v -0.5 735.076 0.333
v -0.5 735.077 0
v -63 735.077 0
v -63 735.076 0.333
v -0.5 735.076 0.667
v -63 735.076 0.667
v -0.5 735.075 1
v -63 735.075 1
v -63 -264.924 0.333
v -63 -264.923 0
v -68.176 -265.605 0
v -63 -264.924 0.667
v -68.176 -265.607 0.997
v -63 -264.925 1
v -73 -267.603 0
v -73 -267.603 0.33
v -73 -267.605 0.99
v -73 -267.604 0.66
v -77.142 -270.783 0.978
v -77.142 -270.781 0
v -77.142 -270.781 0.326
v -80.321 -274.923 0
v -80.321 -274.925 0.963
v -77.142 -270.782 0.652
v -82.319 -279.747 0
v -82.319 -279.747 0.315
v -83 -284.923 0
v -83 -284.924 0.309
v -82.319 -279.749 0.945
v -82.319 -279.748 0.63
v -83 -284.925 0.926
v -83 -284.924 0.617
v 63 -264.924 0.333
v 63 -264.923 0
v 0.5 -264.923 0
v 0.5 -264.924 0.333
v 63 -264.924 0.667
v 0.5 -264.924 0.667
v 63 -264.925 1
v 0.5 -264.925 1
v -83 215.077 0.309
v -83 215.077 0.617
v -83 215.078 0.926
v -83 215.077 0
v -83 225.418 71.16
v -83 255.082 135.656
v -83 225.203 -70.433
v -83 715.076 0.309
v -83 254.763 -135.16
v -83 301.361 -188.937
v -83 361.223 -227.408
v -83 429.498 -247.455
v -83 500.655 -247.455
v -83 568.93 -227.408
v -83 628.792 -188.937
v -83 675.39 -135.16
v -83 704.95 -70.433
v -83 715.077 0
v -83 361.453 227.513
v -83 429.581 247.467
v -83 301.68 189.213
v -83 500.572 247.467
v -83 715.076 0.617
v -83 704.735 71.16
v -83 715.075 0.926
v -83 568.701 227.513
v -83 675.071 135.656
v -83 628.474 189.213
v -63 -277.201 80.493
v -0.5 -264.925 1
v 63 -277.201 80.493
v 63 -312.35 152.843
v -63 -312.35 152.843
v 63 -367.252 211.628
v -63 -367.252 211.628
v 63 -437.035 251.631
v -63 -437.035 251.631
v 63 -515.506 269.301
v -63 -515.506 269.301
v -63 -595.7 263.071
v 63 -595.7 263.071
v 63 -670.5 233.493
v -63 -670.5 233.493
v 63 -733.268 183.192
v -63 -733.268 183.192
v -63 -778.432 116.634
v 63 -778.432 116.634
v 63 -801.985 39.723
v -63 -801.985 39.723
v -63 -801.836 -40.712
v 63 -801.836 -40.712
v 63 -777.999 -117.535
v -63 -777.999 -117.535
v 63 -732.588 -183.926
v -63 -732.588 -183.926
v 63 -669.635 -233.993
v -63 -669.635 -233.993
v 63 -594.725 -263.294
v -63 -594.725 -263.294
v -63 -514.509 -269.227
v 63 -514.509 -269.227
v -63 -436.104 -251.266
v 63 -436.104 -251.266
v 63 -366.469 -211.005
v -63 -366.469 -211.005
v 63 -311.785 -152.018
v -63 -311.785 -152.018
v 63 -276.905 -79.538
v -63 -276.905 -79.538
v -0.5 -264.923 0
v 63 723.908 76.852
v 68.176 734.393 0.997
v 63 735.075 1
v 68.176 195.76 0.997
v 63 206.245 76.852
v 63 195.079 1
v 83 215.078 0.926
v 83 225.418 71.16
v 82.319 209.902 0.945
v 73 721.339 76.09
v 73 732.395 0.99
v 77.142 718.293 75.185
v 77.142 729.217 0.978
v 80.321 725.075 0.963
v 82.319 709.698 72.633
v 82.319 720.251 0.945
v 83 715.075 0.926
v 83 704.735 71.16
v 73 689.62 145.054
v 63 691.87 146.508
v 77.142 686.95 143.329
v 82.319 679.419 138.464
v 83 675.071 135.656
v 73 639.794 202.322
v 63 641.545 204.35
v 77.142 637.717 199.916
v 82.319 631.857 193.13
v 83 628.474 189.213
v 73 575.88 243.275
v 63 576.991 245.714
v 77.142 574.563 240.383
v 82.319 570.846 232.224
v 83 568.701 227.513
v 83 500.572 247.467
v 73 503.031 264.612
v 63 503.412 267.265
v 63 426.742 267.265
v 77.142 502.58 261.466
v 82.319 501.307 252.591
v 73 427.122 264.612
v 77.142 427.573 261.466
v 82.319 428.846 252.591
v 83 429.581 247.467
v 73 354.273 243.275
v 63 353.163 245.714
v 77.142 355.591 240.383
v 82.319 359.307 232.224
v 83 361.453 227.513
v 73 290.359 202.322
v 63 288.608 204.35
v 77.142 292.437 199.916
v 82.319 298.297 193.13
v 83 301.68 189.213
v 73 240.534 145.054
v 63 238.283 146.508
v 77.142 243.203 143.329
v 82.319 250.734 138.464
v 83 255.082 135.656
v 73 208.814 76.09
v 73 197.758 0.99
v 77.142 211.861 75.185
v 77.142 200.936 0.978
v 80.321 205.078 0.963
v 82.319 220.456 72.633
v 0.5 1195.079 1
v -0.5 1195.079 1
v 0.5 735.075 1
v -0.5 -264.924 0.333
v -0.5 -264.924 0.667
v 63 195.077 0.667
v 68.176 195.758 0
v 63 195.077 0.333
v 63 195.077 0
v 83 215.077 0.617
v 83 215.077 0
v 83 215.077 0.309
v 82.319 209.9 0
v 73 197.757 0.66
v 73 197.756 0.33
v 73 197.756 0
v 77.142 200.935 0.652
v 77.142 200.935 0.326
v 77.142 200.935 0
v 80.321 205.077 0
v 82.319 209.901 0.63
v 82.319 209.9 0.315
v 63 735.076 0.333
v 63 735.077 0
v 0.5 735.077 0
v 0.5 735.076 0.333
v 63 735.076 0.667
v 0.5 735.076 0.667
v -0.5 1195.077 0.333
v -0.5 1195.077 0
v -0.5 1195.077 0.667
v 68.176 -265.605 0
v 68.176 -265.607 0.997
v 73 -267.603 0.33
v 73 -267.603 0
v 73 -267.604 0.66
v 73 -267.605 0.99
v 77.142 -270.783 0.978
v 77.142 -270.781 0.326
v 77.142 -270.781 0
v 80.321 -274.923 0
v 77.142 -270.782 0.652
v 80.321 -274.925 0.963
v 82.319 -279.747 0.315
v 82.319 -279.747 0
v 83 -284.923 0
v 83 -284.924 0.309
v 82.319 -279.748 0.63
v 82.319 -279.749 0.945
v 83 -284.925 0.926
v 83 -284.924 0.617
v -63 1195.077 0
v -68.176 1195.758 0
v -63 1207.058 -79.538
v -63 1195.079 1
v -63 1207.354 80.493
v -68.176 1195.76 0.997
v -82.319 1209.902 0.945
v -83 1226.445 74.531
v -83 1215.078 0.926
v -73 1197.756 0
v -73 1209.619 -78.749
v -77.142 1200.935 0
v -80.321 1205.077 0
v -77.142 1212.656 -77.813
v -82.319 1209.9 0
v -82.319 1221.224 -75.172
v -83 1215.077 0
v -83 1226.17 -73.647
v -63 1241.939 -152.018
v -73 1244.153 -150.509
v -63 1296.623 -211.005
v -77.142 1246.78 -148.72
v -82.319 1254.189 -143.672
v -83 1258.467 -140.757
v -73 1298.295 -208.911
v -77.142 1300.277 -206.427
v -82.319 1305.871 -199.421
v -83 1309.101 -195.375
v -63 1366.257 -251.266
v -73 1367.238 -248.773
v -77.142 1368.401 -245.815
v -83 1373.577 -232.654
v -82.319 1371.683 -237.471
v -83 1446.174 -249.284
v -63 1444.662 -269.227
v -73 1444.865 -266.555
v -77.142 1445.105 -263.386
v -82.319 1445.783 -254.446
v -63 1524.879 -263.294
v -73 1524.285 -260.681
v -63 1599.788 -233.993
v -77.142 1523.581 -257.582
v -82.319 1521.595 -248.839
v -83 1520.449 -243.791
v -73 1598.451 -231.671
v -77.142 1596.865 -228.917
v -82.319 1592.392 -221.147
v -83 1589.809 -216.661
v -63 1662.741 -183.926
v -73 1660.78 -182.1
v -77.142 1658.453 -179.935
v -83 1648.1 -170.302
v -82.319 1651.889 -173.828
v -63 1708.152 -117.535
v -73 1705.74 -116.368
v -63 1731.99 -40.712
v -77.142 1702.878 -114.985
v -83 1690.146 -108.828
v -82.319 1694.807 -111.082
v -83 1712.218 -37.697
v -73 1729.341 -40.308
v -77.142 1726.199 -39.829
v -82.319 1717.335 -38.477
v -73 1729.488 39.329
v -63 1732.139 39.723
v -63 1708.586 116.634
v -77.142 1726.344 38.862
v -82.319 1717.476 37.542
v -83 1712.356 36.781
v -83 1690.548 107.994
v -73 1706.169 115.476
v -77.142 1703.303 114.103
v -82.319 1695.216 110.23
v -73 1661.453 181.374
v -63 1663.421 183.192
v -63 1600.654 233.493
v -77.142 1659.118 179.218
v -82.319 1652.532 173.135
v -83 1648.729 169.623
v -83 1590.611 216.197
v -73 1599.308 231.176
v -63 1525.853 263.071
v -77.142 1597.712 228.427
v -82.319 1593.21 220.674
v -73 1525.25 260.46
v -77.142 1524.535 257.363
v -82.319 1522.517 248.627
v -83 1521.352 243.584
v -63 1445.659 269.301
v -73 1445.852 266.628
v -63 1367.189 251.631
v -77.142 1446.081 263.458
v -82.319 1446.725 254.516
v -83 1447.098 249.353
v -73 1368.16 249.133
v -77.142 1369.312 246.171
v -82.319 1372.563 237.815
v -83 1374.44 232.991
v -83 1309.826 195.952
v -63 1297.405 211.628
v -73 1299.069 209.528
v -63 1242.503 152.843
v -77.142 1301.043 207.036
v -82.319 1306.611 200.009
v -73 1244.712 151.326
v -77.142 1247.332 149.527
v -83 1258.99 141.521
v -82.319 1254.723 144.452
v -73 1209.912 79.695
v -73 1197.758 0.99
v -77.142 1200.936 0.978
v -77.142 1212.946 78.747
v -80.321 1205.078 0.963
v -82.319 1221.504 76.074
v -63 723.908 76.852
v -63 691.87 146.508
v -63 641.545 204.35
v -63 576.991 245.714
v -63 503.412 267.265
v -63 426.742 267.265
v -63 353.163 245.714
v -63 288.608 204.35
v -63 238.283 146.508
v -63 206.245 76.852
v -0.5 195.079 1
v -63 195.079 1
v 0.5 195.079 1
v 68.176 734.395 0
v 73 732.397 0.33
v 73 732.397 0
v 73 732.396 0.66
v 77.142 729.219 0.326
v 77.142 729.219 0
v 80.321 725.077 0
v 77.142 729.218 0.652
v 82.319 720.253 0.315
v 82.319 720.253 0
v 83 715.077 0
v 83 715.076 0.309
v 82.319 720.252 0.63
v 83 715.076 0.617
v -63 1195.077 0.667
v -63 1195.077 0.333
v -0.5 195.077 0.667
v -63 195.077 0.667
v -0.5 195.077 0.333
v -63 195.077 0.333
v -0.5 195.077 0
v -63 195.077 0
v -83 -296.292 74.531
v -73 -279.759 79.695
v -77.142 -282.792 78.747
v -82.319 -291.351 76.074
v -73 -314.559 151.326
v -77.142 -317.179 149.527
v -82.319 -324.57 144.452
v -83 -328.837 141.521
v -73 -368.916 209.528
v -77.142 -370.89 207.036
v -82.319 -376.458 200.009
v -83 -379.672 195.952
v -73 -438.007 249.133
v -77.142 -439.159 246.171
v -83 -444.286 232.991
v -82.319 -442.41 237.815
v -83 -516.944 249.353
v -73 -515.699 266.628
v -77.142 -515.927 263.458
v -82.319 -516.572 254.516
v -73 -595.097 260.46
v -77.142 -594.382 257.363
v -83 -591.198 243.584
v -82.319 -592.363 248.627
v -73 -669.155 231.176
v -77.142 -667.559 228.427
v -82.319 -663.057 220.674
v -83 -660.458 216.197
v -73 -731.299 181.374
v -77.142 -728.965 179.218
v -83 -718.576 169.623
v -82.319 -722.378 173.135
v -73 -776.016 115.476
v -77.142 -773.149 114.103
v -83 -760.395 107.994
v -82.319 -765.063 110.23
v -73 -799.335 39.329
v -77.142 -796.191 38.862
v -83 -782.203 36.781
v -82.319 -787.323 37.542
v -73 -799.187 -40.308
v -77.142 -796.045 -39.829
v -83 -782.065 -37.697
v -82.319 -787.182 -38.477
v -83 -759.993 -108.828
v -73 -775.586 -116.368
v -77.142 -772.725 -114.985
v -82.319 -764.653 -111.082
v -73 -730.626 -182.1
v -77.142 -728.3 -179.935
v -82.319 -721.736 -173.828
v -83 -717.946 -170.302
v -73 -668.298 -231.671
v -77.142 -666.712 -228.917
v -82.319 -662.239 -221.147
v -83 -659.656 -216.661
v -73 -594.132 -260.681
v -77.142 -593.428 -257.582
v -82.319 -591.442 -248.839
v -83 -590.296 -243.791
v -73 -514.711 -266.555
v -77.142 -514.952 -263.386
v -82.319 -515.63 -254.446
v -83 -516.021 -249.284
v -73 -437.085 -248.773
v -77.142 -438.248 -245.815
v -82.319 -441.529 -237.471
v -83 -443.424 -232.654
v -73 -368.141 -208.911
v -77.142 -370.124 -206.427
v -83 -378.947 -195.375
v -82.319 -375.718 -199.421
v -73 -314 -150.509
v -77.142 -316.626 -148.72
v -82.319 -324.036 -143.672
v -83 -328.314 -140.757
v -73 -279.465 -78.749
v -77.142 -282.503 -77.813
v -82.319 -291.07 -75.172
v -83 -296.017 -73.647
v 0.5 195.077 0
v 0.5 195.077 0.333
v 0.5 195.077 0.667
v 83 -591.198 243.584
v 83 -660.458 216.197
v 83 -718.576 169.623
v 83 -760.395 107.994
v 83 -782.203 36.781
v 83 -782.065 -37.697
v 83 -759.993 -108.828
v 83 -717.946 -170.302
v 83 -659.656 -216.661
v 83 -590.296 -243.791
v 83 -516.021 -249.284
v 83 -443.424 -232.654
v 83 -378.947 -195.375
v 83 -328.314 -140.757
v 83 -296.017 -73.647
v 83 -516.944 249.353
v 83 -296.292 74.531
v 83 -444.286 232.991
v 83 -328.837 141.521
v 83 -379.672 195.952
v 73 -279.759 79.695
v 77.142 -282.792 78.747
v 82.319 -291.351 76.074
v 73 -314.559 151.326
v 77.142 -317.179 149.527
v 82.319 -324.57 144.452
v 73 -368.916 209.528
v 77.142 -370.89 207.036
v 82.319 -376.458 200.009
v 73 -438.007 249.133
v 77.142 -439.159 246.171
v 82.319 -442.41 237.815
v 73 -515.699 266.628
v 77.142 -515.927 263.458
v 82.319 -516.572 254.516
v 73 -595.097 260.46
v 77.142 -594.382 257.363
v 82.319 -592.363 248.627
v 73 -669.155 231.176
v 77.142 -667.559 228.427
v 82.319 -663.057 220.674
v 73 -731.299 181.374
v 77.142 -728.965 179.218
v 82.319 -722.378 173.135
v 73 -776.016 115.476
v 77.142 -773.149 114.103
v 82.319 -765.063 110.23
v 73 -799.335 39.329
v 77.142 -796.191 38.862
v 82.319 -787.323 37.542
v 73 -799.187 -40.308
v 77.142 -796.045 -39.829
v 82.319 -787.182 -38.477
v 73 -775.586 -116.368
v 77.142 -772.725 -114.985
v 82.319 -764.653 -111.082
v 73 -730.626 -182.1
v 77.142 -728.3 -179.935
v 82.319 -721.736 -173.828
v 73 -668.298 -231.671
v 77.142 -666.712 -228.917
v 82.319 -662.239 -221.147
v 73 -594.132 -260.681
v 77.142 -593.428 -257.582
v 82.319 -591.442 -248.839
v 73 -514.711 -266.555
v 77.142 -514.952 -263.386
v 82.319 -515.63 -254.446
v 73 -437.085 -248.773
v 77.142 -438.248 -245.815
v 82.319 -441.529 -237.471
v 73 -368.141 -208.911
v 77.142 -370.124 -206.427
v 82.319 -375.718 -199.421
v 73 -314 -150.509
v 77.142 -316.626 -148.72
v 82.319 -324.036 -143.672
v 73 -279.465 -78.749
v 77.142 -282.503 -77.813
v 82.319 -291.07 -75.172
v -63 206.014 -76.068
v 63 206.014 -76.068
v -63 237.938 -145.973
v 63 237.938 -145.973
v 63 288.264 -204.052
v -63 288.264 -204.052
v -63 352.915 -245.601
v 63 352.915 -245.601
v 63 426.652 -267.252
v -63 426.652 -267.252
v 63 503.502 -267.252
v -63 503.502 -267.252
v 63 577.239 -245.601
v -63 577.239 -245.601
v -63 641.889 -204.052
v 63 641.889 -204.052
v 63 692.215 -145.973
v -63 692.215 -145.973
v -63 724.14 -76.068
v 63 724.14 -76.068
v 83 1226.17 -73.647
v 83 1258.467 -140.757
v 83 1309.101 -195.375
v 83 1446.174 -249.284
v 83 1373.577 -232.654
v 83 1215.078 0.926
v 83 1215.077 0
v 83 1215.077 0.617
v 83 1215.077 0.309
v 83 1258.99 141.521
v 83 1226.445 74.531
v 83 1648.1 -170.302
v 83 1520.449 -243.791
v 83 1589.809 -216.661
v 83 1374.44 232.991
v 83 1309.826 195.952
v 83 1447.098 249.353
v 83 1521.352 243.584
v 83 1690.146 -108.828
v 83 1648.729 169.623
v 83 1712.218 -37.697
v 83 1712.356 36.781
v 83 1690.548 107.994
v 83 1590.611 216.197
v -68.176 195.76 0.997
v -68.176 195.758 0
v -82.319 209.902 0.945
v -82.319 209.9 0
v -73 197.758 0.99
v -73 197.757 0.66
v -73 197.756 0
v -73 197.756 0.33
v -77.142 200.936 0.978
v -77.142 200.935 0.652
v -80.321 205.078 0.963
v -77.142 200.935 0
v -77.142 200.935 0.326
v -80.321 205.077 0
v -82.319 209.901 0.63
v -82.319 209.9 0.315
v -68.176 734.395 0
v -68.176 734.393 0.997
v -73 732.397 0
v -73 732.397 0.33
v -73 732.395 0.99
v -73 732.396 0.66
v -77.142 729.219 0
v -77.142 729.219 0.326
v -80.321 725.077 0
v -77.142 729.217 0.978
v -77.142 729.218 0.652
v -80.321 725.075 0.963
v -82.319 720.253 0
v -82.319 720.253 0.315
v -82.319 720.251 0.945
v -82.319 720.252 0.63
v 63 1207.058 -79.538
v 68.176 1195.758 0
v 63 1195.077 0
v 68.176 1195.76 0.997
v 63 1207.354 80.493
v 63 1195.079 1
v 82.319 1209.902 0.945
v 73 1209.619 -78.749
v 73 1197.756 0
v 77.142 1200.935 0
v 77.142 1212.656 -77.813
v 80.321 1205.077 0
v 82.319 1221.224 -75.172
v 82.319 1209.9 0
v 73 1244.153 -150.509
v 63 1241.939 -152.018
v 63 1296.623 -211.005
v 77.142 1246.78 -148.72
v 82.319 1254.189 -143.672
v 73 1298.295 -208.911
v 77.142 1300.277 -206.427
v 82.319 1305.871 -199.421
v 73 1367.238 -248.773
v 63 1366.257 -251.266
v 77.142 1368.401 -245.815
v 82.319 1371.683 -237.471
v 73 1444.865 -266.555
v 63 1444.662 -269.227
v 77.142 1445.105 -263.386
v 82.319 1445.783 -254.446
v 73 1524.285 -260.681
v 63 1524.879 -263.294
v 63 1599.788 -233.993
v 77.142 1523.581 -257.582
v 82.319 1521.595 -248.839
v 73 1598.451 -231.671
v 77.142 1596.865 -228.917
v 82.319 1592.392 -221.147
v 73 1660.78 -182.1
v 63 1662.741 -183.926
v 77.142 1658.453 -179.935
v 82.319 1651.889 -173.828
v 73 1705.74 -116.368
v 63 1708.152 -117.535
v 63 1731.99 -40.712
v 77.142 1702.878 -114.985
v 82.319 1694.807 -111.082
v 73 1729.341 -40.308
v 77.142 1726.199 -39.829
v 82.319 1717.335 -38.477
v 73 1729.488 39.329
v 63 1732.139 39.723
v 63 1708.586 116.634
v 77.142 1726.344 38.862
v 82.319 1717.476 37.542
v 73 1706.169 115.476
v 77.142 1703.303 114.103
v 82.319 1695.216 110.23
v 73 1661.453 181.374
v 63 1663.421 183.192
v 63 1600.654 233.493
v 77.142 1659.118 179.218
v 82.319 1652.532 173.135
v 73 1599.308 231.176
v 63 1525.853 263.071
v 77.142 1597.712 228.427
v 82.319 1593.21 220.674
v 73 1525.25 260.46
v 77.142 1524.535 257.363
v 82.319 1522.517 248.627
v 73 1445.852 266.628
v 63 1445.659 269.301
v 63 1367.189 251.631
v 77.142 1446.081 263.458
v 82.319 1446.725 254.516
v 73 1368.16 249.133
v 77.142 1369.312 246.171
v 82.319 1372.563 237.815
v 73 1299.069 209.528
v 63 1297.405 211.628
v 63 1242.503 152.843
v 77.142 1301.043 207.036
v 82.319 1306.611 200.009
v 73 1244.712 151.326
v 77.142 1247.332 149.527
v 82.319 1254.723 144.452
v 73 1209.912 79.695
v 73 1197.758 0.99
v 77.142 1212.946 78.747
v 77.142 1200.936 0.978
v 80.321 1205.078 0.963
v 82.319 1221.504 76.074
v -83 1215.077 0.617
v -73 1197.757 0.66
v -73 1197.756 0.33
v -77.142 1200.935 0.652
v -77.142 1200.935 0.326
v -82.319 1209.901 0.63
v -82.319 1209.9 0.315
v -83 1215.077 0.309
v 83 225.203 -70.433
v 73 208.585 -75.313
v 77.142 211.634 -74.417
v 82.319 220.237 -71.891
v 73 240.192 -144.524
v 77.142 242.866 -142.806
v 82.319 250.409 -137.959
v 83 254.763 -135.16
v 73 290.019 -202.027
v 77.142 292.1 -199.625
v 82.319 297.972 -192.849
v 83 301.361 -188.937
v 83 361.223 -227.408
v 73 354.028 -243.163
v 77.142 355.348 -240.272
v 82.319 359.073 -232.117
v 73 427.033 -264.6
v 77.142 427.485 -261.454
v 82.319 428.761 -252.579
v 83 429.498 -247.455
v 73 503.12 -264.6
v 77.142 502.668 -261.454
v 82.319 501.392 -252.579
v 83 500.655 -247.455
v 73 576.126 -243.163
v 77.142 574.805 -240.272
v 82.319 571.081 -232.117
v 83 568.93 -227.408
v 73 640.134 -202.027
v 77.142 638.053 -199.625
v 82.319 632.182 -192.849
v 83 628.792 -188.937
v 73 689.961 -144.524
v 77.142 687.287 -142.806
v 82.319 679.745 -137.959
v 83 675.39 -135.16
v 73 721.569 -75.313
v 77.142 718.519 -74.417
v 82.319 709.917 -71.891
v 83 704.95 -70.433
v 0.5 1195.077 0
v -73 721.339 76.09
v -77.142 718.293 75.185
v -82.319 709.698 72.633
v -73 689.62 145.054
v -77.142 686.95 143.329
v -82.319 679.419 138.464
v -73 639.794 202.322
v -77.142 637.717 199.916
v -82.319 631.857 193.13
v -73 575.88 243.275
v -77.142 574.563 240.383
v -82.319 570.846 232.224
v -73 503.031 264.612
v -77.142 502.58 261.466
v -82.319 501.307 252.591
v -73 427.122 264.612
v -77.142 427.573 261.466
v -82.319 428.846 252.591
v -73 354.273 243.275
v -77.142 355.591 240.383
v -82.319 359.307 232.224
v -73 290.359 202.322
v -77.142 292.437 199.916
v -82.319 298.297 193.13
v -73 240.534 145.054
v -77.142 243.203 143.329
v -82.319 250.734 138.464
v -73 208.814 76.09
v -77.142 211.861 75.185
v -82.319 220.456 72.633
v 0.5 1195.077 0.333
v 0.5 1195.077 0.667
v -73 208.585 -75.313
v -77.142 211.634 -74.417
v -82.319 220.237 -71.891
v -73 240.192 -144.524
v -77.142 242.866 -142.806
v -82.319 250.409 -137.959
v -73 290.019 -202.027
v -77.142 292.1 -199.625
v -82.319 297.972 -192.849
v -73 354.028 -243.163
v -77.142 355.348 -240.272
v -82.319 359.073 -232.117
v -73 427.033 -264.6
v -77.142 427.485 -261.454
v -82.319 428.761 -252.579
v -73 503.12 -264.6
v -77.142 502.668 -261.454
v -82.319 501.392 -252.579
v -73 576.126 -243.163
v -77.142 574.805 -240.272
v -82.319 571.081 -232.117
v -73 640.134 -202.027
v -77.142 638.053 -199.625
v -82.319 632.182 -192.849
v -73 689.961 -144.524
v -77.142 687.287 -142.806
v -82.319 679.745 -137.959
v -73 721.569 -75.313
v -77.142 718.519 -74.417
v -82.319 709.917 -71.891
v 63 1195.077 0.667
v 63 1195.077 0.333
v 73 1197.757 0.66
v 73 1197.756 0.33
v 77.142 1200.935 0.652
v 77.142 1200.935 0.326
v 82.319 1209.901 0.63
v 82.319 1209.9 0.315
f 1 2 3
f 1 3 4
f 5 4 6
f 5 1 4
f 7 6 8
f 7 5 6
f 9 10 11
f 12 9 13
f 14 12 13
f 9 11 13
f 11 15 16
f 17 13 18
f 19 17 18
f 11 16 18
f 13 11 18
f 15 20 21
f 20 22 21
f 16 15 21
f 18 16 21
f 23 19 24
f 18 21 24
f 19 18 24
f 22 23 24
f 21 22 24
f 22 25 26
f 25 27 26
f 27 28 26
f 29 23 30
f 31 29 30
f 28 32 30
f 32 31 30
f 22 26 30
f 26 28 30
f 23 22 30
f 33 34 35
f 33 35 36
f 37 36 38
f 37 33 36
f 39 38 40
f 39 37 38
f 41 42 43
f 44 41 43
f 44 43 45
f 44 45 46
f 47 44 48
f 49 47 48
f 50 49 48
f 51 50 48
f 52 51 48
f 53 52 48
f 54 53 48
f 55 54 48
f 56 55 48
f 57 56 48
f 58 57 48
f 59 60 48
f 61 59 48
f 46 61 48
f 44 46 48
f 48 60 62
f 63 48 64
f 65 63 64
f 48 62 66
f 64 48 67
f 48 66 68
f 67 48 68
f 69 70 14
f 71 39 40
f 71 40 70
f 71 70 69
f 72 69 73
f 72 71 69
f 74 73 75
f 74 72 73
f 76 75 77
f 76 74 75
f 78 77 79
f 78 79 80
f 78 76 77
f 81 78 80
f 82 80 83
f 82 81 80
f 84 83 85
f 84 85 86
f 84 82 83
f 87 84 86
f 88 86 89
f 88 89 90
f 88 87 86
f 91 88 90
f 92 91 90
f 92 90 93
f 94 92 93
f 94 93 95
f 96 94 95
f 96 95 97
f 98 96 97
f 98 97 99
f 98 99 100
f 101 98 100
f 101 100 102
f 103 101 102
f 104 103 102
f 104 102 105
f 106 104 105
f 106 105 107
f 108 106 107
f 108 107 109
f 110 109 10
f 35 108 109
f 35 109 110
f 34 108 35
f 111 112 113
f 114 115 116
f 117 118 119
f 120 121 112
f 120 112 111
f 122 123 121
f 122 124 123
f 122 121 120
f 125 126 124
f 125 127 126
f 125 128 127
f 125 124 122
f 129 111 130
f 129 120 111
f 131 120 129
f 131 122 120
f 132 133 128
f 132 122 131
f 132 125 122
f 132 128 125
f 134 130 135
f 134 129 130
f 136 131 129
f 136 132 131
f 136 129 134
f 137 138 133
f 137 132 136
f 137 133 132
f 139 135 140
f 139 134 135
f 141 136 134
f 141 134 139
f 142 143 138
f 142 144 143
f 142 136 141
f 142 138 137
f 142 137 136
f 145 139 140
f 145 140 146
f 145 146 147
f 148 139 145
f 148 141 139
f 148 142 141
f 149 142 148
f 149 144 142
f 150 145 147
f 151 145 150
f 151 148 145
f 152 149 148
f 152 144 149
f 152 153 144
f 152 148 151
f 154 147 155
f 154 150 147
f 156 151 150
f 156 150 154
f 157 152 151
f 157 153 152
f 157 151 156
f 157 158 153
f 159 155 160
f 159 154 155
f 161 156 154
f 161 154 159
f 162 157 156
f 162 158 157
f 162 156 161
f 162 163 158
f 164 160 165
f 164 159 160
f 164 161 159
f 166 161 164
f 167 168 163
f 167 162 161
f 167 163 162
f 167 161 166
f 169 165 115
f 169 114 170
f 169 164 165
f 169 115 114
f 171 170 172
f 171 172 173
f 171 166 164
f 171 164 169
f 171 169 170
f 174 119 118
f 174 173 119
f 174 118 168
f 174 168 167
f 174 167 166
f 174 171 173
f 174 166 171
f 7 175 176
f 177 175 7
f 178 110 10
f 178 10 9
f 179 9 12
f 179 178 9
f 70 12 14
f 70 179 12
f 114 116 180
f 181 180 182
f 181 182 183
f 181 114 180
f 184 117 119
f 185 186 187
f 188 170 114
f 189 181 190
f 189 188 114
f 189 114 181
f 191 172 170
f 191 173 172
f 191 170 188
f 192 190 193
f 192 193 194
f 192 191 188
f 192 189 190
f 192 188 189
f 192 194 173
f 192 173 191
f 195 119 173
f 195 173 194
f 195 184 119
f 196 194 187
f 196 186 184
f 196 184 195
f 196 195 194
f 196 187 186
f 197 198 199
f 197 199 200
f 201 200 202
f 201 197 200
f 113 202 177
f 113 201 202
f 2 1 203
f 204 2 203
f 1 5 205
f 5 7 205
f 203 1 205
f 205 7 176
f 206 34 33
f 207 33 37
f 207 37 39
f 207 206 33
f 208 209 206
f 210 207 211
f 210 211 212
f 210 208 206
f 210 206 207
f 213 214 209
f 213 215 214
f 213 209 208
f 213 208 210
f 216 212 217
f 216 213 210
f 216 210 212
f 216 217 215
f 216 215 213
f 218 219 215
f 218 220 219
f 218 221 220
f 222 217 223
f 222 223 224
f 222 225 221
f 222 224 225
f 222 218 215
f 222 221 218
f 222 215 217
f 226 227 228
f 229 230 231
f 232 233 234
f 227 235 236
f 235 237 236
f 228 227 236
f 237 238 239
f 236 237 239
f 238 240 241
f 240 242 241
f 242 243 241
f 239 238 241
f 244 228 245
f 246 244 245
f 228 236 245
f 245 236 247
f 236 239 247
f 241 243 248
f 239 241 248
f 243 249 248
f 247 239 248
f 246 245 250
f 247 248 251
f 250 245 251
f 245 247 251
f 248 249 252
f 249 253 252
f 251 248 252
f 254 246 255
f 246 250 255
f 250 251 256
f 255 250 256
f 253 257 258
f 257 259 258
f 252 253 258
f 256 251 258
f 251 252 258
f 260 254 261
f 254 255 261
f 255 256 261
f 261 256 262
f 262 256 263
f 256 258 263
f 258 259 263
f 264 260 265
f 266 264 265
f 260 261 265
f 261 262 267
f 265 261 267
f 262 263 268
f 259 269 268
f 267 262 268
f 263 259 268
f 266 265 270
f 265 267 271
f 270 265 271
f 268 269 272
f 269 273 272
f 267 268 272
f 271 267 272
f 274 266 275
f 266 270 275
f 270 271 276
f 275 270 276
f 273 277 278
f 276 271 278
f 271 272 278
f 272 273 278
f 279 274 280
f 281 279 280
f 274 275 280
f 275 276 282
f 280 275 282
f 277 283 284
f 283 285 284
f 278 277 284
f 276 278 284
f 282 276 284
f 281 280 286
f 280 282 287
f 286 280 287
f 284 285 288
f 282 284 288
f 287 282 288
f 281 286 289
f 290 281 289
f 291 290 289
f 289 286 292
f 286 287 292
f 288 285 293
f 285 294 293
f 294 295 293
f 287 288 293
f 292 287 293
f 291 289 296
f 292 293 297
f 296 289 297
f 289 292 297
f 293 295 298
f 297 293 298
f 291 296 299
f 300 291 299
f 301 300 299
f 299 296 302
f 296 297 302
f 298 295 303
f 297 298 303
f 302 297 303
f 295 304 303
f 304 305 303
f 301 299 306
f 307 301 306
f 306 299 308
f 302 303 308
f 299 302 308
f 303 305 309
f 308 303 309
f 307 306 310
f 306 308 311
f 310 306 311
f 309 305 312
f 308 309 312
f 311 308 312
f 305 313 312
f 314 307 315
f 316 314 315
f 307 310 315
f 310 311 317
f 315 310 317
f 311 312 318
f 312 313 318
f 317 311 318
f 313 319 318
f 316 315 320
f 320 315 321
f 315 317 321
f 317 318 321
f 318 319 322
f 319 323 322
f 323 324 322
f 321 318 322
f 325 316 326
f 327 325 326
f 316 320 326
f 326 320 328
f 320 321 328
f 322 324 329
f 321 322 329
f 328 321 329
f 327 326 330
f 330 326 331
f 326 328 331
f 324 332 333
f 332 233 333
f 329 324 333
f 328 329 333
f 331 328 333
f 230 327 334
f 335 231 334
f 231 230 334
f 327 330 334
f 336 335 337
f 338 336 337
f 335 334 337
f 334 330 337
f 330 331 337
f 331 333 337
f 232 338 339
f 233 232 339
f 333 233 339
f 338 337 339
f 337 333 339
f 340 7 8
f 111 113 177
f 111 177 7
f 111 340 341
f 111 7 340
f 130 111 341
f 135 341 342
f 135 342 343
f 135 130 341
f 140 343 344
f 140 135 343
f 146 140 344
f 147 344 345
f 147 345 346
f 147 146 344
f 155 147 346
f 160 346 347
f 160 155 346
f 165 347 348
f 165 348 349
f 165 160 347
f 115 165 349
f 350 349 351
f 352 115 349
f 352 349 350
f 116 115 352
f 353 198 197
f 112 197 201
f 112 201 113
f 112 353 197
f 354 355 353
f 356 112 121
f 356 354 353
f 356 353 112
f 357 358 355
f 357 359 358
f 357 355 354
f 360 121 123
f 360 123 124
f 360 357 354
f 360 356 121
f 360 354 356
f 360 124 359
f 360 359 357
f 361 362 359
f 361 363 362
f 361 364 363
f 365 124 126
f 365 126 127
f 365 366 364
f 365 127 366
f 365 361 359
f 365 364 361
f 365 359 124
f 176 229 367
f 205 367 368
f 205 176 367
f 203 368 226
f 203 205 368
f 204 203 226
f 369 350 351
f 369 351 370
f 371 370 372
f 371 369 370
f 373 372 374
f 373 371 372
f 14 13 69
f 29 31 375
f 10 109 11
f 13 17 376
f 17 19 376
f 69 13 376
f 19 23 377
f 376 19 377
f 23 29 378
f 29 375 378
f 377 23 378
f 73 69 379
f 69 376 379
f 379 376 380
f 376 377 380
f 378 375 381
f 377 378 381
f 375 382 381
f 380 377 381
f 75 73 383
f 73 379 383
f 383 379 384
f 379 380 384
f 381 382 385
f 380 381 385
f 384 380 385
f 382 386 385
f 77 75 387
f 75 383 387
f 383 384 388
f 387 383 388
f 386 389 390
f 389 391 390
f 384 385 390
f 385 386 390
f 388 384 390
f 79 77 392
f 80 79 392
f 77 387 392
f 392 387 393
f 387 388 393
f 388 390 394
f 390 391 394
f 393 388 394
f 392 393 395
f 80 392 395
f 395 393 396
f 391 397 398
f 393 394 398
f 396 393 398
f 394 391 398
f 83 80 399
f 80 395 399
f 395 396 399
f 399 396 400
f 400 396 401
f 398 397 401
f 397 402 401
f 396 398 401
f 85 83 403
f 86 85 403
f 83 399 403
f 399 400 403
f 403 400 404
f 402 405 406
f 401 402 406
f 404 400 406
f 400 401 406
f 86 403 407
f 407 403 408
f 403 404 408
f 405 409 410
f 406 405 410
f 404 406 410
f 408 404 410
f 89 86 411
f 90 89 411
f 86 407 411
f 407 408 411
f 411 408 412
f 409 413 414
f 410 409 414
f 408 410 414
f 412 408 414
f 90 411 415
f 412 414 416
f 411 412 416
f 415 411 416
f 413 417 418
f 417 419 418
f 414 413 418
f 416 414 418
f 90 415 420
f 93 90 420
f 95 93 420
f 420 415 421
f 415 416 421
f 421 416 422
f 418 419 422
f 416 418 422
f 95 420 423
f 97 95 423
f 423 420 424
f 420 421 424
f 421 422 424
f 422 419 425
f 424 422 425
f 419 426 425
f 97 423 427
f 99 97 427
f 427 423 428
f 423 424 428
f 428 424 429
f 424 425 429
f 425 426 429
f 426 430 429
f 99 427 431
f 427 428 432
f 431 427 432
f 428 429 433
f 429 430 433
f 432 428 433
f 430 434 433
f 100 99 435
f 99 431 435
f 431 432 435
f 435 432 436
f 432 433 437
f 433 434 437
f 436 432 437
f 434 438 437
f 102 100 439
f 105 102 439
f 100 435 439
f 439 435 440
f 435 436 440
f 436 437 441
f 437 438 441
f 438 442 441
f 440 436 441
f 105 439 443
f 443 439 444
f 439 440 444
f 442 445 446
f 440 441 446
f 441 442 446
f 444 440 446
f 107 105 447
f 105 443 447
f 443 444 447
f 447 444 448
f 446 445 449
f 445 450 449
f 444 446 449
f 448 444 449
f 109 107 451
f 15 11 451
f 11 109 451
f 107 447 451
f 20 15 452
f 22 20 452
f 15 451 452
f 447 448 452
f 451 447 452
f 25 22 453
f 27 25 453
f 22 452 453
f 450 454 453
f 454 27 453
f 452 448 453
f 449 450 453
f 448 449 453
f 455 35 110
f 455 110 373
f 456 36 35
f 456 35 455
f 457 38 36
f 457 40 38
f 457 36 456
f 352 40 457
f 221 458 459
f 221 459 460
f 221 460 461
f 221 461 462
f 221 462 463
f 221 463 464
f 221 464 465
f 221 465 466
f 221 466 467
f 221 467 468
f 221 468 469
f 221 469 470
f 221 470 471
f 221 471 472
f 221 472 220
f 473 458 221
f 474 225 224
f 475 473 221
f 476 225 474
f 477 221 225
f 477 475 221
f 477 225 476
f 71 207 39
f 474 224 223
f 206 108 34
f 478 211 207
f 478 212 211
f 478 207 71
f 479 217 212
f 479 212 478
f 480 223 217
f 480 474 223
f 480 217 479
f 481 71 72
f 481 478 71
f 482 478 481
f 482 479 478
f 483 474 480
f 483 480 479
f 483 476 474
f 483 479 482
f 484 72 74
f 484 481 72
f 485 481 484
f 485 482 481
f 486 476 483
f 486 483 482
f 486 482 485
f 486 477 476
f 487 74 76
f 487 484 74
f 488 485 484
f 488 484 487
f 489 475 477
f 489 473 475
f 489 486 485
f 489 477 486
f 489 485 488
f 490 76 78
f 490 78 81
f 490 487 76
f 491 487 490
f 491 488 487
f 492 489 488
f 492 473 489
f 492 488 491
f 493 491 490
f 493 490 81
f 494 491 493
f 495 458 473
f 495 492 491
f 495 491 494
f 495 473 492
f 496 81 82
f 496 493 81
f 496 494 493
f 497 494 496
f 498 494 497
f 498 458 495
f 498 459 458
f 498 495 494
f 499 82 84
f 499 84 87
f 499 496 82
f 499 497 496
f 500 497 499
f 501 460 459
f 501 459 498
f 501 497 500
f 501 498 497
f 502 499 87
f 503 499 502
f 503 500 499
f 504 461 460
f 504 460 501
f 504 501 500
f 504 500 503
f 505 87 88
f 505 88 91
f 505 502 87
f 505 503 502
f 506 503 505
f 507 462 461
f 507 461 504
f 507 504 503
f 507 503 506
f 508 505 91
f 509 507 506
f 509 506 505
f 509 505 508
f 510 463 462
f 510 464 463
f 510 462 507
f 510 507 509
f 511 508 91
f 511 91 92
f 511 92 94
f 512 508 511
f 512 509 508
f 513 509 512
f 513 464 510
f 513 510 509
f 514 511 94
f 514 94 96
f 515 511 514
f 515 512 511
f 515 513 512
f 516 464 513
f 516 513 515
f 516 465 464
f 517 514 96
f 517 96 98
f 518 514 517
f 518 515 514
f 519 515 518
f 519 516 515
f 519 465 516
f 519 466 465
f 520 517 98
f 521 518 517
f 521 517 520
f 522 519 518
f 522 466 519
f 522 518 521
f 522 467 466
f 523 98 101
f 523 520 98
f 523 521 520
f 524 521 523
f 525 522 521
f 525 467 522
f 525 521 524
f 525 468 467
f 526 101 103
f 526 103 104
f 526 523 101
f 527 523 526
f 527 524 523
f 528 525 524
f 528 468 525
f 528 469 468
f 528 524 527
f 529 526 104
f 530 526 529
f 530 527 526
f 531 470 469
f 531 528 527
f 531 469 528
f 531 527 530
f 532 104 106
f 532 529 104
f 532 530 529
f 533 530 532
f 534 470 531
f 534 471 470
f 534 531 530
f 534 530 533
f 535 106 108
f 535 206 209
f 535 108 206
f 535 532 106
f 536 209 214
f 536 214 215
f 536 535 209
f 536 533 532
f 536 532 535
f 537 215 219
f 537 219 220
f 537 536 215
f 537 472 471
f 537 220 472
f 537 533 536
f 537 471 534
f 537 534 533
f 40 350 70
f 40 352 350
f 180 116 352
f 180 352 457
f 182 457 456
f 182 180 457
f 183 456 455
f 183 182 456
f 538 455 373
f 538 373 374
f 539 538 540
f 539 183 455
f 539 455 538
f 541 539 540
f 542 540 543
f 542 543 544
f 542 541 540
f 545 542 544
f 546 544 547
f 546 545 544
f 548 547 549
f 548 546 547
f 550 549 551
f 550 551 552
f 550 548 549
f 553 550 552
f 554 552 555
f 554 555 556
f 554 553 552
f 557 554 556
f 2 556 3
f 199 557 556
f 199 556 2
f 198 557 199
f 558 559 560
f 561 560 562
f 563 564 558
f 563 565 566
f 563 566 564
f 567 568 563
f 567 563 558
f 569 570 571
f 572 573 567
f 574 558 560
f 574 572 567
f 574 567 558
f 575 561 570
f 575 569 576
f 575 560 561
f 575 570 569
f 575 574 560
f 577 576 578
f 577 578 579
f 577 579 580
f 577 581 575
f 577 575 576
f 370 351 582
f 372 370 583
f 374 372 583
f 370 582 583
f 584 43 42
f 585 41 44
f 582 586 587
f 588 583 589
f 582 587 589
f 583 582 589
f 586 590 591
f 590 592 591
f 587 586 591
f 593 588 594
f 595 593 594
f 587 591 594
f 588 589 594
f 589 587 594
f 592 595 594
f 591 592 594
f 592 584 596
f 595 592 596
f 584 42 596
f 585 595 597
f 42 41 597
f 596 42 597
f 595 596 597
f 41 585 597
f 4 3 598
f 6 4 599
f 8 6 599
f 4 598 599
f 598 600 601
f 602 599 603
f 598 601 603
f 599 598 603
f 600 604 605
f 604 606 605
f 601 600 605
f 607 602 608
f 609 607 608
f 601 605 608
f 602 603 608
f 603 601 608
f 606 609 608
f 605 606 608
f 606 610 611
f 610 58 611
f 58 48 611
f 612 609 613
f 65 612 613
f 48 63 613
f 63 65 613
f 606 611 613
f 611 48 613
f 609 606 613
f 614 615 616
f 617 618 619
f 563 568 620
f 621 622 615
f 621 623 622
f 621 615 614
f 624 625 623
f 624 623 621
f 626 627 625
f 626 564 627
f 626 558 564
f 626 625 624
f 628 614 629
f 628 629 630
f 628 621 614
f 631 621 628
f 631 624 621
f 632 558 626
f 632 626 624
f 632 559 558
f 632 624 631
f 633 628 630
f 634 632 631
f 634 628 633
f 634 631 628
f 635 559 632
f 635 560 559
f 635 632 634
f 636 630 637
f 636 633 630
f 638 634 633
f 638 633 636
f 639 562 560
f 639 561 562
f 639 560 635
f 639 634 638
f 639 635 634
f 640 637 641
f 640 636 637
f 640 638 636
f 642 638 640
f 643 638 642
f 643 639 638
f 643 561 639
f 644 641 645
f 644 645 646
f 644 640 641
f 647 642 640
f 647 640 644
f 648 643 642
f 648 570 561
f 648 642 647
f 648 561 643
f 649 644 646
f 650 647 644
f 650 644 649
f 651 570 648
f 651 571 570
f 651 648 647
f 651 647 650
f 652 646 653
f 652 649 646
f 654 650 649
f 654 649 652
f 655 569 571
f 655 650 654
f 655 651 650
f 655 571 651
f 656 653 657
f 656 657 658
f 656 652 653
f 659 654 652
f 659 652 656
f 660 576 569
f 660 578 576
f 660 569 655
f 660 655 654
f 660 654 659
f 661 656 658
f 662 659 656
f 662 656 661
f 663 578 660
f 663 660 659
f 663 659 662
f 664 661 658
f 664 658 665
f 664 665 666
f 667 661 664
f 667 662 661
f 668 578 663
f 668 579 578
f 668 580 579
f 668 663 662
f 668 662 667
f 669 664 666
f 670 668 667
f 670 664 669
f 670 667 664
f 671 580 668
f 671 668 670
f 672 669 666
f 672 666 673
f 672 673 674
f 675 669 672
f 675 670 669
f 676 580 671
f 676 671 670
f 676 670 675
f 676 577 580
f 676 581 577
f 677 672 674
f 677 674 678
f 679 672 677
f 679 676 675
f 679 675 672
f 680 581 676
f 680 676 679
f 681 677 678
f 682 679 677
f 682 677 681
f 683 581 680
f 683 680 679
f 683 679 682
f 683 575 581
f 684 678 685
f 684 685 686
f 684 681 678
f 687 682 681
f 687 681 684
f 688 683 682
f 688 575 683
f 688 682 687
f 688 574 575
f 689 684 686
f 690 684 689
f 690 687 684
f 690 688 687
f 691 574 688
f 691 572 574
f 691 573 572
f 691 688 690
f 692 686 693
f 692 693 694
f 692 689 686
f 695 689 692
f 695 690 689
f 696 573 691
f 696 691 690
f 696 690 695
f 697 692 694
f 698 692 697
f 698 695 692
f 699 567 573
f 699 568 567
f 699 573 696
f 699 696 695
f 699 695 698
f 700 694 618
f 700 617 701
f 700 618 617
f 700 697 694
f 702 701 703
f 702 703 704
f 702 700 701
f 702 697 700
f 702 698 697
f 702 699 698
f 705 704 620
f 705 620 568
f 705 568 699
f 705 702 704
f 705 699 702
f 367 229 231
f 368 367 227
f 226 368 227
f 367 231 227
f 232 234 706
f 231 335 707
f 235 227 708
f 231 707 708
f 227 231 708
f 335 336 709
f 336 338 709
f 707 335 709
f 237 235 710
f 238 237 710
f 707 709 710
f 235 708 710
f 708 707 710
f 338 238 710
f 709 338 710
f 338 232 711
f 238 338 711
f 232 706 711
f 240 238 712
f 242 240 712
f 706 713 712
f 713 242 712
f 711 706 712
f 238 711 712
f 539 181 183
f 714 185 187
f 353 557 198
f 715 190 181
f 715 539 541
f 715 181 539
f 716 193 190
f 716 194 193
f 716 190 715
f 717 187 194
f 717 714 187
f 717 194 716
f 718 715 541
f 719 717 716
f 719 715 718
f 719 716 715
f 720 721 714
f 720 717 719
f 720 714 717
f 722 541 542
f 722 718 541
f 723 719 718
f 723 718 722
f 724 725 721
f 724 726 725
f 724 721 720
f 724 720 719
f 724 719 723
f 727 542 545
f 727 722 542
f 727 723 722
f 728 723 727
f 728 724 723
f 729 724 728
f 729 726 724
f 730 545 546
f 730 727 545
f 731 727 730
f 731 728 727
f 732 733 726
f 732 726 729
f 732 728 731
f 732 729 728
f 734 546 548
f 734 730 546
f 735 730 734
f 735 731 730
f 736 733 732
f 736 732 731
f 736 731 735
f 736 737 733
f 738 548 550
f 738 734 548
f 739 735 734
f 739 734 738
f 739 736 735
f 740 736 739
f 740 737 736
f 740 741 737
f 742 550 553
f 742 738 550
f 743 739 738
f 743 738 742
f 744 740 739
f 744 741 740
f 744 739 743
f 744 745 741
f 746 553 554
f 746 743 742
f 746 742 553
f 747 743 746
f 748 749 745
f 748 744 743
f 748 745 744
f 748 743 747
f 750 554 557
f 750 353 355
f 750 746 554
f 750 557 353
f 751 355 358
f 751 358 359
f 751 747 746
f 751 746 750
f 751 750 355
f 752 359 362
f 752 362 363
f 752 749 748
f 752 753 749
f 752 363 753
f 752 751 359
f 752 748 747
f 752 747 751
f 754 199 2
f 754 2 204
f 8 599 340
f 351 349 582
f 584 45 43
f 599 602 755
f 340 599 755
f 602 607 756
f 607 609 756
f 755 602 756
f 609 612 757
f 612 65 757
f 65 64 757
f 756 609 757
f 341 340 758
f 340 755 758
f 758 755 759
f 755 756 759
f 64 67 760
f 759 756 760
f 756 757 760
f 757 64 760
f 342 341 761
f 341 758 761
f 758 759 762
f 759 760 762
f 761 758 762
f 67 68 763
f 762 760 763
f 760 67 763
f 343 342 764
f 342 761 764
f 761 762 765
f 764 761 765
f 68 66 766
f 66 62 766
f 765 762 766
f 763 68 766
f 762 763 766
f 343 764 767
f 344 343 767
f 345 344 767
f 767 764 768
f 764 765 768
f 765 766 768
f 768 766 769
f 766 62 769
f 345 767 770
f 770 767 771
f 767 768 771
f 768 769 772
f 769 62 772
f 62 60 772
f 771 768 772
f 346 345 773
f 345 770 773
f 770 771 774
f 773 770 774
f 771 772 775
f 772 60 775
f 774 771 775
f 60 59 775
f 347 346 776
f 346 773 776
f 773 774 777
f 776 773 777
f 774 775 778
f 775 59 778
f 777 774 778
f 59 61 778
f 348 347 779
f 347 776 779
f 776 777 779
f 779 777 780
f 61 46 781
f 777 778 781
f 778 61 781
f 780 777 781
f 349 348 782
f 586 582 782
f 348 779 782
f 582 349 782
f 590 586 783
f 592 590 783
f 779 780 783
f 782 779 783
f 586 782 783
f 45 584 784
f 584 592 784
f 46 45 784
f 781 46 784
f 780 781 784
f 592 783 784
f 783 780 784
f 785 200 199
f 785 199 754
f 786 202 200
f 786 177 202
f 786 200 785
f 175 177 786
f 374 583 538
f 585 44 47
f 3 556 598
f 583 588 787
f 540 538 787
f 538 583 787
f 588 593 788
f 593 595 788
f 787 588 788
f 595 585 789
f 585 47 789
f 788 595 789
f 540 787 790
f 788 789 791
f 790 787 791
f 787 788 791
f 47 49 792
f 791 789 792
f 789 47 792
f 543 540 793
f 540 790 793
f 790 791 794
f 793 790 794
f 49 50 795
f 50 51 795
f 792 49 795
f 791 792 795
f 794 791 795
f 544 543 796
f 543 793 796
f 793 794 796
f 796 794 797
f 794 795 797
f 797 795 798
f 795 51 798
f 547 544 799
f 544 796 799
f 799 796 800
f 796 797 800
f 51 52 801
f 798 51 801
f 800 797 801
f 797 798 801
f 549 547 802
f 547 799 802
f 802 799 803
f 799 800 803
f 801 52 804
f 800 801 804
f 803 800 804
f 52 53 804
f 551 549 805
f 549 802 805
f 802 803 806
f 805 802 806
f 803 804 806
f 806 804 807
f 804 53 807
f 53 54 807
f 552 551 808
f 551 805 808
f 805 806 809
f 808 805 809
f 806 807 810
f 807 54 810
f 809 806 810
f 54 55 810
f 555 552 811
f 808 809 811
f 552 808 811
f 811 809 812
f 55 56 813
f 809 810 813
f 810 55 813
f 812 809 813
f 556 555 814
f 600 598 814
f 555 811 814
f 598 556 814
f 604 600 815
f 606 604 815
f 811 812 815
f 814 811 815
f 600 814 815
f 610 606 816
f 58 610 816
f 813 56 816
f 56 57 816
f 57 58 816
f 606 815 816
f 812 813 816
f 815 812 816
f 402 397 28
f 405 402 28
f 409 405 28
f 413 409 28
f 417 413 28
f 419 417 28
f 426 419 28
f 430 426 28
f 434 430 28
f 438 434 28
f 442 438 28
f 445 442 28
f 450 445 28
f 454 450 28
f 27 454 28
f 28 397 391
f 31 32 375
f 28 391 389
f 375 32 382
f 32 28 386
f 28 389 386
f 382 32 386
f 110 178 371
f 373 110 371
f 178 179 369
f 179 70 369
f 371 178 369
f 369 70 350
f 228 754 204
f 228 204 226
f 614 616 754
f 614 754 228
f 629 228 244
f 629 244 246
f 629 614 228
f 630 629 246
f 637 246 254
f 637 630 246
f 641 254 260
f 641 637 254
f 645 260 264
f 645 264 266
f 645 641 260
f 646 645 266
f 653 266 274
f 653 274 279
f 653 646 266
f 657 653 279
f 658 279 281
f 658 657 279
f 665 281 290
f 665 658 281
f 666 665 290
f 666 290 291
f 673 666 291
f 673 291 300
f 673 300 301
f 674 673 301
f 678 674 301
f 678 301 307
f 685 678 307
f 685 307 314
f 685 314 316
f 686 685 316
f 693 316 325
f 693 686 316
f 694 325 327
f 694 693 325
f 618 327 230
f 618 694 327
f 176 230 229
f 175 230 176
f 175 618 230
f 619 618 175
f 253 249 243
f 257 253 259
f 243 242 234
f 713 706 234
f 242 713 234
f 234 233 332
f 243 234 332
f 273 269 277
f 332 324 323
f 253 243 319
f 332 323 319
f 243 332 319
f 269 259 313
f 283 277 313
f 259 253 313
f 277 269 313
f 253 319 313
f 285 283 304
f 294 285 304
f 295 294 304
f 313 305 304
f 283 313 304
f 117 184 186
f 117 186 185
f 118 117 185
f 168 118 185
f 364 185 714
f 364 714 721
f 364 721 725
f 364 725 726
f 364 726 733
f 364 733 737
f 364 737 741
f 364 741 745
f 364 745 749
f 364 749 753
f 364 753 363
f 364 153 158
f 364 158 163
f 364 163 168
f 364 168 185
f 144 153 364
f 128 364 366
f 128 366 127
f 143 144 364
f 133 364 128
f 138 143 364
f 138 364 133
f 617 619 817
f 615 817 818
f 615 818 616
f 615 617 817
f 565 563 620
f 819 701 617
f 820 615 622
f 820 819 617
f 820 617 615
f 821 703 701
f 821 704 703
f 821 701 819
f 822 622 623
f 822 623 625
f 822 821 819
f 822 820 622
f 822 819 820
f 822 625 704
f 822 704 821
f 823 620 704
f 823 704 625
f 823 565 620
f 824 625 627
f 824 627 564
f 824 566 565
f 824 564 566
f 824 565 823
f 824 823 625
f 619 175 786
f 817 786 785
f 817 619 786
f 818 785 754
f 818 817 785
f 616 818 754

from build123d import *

# Parameters (mm, degrees)
F1_DEPTH = 83
F2_R     = 20
F2_2_R   = 20
F2_3_R   = 20
F3_DEPTH = 0.5


with BuildPart() as f1:
    # F0 (on Right) → F1 (new body, symmetric)
    with BuildSketch(Plane.YZ):
        with BuildLine():
            ThreePointArc((-264.9251804996, 1), (-804.9228656765, -0.5000008573), (-264.9233286414, 0))
            Line((-264.9233286414, 0), (-534.9233286414, 0))
            Line((-534.9233286414, 0), (-534.9233286414, 1))
            Line((-534.9233286414, 1), (-264.9251804996, 1))
        make_face()
        with BuildLine():
            Line((-534.9233286414, 0), (-264.9233286414, 0))
            ThreePointArc((-264.9233286414, 0), (-264.9237916064, 0.5000008573), (-264.9251804996, 1))
            Line((-264.9251804996, 1), (-534.9233286414, 1))
            Line((-534.9233286414, 1), (-534.9233286414, 0))
        make_face()
    extrude(amount=F1_DEPTH, both=True)

    # F2
    f2_edges = [f1.edges().sort_by_distance(p)[0] for p in [
        (83, -804.923329, 0),
        (-83, -804.923329, 0),
    ]]
    fillet(f2_edges, radius=F2_R)



with BuildPart() as f1b:
    # F0 (on Right) → F1, piece 2 (new body, symmetric)
    with BuildSketch(Plane.YZ):
        with BuildLine():
            ThreePointArc((735.0748195004, 1), (465.0766713586, 270), (195.0785232168, 1))
            Line((195.0785232168, 1), (735.0748195004, 1))
        make_face()
        with BuildLine():
            Line((735.0766713586, 0), (195.0766713586, 0))
            ThreePointArc((195.0766713586, 0), (465.0766713586, -270), (735.0766713586, 0))
        make_face()
        with BuildLine():
            ThreePointArc((195.0785232168, 1), (195.0771343235, 0.5000008573), (195.0766713586, 0))
            Line((195.0766713586, 0), (735.0766713586, 0))
            ThreePointArc((735.0766713586, 0), (735.0762083936, 0.5000008573), (735.0748195004, 1))
            Line((735.0748195004, 1), (195.0785232168, 1))
        make_face()
    extrude(amount=F1_DEPTH, both=True)

    # F2#2
    f2_2_edges = [f1b.edges().sort_by_distance(p)[0] for p in [
        (83, 735.07482, -1),
        (-83, 735.07482, -1),
    ]]
    fillet(f2_2_edges, radius=F2_2_R)


with BuildPart() as f1c:
    # F0 (on Right) → F1, piece 3 (new body, symmetric)
    with BuildSketch(Plane.YZ):
        with BuildLine():
            Line((1465.0766713586, 0), (1195.0766713586, 0))
            ThreePointArc((1195.0766713586, 0), (1465.0766713586, -270), (1735.0766713586, 0))
            ThreePointArc((1735.0766713586, 0), (1465.5766722159, 269.9995370351), (1195.0785232168, 1))
            Line((1195.0785232168, 1), (1465.0766713586, 1))
            Line((1465.0766713586, 1), (1465.0766713586, 0))
        make_face()
        with BuildLine():
            ThreePointArc((1195.0785232168, 1), (1195.0771343235, 0.5000008573), (1195.0766713586, 0))
            Line((1195.0766713586, 0), (1465.0766713586, 0))
            Line((1465.0766713586, 0), (1465.0766713586, 1))
            Line((1465.0766713586, 1), (1195.0785232168, 1))
        make_face()
    extrude(amount=F1_DEPTH, both=True)

    # F2#3
    f2_3_edges = [f1c.edges().sort_by_distance(p)[0] for p in [
        (83, 1195.076671, 0),
        (-83, 1195.076671, 0),
    ]]
    fillet(f2_3_edges, radius=F2_3_R)


with BuildPart() as f1_1:
    add(f1.part)

    add(f1b.part)  # F3 merges F1b

    add(f1c.part)  # F3 merges F1c
    # F0 (on Right) → F3 (join, symmetric)
    with BuildSketch(Plane.YZ):
        with BuildLine():
            Line((-534.9233286414, 0), (-264.9233286414, 0))
            ThreePointArc((-264.9233286414, 0), (-264.9237916064, 0.5000008573), (-264.9251804996, 1))
            Line((-264.9251804996, 1), (-534.9233286414, 1))
            Line((-534.9233286414, 1), (-534.9233286414, 0))
        make_face()
        with BuildLine():
            ThreePointArc((-264.9251804996, 1), (-804.9228656765, -0.5000008573), (-264.9233286414, 0))
            Line((-264.9233286414, 0), (-534.9233286414, 0))
            Line((-534.9233286414, 0), (-534.9233286414, 1))
            Line((-534.9233286414, 1), (-264.9251804996, 1))
        make_face()
        with BuildLine():
            ThreePointArc((-264.9251804996, 1), (-264.9237916064, 0.5000008573), (-264.9233286414, 0))
            Line((-264.9233286414, 0), (195.0766713586, 0))
            ThreePointArc((195.0766713586, 0), (195.0771343235, 0.5000008573), (195.0785232168, 1))
            Line((195.0785232168, 1), (-264.9251804996, 1))
        make_face()
        with BuildLine():
            Line((735.0766713586, 0), (195.0766713586, 0))
            ThreePointArc((195.0766713586, 0), (465.0766713586, -270), (735.0766713586, 0))
        make_face()
        with BuildLine():
            ThreePointArc((195.0785232168, 1), (195.0771343235, 0.5000008573), (195.0766713586, 0))
            Line((195.0766713586, 0), (735.0766713586, 0))
            ThreePointArc((735.0766713586, 0), (735.0762083936, 0.5000008573), (735.0748195004, 1))
            Line((735.0748195004, 1), (195.0785232168, 1))
        make_face()
        with BuildLine():
            ThreePointArc((735.0748195004, 1), (465.0766713586, 270), (195.0785232168, 1))
            Line((195.0785232168, 1), (735.0748195004, 1))
        make_face()
        with BuildLine():
            ThreePointArc((735.0748195004, 1), (735.0762083936, 0.5000008573), (735.0766713586, 0))
            Line((735.0766713586, 0), (1195.0766713586, 0))
            ThreePointArc((1195.0766713586, 0), (1195.0771343235, 0.5000008573), (1195.0785232168, 1))
            Line((1195.0785232168, 1), (735.0748195004, 1))
        make_face()
        with BuildLine():
            Line((1465.0766713586, 0), (1195.0766713586, 0))
            ThreePointArc((1195.0766713586, 0), (1465.0766713586, -270), (1735.0766713586, 0))
            ThreePointArc((1735.0766713586, 0), (1465.5766722159, 269.9995370351), (1195.0785232168, 1))
            Line((1195.0785232168, 1), (1465.0766713586, 1))
            Line((1465.0766713586, 1), (1465.0766713586, 0))
        make_face()
        with BuildLine():
            ThreePointArc((1195.0785232168, 1), (1195.0771343235, 0.5000008573), (1195.0766713586, 0))
            Line((1195.0766713586, 0), (1465.0766713586, 0))
            Line((1465.0766713586, 0), (1465.0766713586, 1))
            Line((1465.0766713586, 1), (1195.0785232168, 1))
        make_face()
    extrude(amount=F3_DEPTH, both=True)


solid = f1_1.part
